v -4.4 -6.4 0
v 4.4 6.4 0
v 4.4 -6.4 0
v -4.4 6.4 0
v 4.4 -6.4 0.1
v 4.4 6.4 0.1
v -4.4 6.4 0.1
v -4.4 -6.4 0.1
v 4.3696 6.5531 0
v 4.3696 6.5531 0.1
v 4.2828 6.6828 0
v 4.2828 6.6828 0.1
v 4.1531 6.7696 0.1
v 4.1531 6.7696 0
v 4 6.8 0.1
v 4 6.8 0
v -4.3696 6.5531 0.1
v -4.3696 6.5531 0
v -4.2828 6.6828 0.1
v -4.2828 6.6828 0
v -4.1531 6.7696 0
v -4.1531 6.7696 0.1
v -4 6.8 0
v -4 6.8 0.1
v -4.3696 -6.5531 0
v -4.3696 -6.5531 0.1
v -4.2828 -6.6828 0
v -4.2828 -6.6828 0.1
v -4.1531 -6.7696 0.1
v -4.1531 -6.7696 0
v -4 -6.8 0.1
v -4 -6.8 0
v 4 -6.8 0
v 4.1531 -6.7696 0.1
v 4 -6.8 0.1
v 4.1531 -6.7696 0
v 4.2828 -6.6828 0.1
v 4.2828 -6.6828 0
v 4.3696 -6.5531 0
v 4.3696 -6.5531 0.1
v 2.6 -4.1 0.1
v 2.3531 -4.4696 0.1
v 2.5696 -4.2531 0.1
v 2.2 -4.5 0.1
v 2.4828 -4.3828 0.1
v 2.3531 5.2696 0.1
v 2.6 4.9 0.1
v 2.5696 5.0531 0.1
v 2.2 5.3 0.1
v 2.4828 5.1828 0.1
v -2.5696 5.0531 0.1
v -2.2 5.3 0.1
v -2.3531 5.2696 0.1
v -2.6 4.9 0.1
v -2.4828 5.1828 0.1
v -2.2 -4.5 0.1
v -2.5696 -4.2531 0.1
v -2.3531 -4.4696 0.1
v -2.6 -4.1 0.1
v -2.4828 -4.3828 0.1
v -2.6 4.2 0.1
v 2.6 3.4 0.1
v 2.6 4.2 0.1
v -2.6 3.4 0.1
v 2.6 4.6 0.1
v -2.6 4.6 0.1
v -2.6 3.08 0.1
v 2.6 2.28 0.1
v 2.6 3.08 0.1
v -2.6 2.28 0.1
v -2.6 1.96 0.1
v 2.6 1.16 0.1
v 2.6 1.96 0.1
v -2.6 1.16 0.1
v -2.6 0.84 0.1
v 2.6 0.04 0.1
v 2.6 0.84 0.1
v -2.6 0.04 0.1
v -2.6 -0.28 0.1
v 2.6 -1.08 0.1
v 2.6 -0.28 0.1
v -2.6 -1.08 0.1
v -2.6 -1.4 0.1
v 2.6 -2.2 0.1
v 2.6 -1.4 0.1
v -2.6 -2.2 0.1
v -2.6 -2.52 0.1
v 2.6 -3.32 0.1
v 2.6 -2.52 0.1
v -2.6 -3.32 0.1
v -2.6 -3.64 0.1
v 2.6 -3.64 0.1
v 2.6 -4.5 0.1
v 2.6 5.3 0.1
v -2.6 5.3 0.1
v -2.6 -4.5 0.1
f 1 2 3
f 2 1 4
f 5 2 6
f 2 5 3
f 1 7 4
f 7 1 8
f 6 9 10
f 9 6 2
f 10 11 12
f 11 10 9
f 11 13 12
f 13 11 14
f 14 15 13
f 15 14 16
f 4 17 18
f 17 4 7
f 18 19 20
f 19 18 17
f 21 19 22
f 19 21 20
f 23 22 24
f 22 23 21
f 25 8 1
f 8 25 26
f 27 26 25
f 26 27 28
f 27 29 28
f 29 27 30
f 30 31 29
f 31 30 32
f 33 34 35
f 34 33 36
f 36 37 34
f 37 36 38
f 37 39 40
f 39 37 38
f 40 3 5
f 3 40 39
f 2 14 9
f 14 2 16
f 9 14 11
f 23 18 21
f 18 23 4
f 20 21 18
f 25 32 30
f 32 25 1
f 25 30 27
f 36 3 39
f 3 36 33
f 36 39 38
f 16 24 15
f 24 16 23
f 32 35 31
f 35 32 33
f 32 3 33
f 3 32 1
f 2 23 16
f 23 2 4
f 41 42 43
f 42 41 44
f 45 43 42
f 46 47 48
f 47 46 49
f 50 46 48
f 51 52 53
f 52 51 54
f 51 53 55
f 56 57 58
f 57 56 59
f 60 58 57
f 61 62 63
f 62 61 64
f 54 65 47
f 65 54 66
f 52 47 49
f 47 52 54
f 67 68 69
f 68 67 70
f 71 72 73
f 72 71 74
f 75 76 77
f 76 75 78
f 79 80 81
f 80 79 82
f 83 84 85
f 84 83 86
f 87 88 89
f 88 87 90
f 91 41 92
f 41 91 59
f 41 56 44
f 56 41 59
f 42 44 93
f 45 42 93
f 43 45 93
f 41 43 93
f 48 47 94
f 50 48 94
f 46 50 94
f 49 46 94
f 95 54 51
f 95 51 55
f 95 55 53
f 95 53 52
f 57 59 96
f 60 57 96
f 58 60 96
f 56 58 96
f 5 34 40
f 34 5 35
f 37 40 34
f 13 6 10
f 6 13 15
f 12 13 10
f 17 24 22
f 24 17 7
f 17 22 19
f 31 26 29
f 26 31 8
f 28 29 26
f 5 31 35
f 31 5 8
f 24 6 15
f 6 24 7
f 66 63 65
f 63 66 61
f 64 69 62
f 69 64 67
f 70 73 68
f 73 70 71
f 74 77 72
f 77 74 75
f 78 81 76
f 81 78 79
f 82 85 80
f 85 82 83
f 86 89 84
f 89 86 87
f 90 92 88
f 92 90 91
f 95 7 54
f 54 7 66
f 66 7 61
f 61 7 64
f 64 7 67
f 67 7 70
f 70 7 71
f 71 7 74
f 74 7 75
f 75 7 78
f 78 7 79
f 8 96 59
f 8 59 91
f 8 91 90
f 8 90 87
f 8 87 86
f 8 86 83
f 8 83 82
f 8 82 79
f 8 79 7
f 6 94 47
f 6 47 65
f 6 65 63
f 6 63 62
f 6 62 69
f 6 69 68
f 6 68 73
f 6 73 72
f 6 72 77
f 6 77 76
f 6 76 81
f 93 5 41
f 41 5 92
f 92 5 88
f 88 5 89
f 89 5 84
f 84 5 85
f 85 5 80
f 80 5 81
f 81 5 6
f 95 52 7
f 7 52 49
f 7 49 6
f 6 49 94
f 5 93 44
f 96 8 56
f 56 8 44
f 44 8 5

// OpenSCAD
// file: ../p/4-4edge.scad
use <../lib.scad>
$fa=1; $fs=0.2;
function ldraw_lib__4_4edge(realsolid=false) = [
// 0 Circle 1.0
// 0 Name: 4-4edge.dat
// 0 Author: James Jessiman
// 0 !LDRAW_ORG Primitive UPDATE 2017-01
// 0 !LICENSE Licensed under CC BY 2.0 and CC BY 4.0 : see CAreadme.txt
// 
// 0 BFC CERTIFY CCW
  [0,"BFC","CERTIFY"],
  [0,"BFC","CCW"],
// 
// 0 !HISTORY 1998-12-15 [PTadmin] Official Update 1998-10
// 0 !HISTORY 2005-12-28 [PTadmin] Official Update 2005-01
// 0 !HISTORY 2007-06-24 [PTadmin] Header formatted for Contributor Agreement
// 0 !HISTORY 2008-07-01 [PTadmin] Official Update 2008-01
// 0 !HISTORY 2017-01-15 [Steffen] BFCed
// 0 !HISTORY 2017-12-30 [PTadmin] Official Update 2017-01
// 
// 
// 2 24 1 0 0 0.9239 0 0.3827
  [2,24,1,0,0,0.9239,0,0.3827],
// 2 24 0.9239 0 0.3827 0.7071 0 0.7071
  [2,24,0.9239,0,0.3827,0.7071,0,0.7071],
// 2 24 0.7071 0 0.7071 0.3827 0 0.9239
  [2,24,0.7071,0,0.7071,0.3827,0,0.9239],
// 2 24 0.3827 0 0.9239 0 0 1
  [2,24,0.3827,0,0.9239,0,0,1],
// 2 24 0 0 1 -0.3827 0 0.9239
  [2,24,0,0,1,-0.3827,0,0.9239],
// 2 24 -0.3827 0 0.9239 -0.7071 0 0.7071
  [2,24,-0.3827,0,0.9239,-0.7071,0,0.7071],
// 2 24 -0.7071 0 0.7071 -0.9239 0 0.3827
  [2,24,-0.7071,0,0.7071,-0.9239,0,0.3827],
// 2 24 -0.9239 0 0.3827 -1 0 -0
  [2,24,-0.9239,0,0.3827,-1,0,-0],
// 2 24 -1 0 -0 -0.9239 0 -0.3827
  [2,24,-1,0,-0,-0.9239,0,-0.3827],
// 2 24 -0.9239 0 -0.3827 -0.7071 0 -0.7071
  [2,24,-0.9239,0,-0.3827,-0.7071,0,-0.7071],
// 2 24 -0.7071 0 -0.7071 -0.3827 0 -0.9239
  [2,24,-0.7071,0,-0.7071,-0.3827,0,-0.9239],
// 2 24 -0.3827 0 -0.9239 0 0 -1
  [2,24,-0.3827,0,-0.9239,0,0,-1],
// 2 24 0 0 -1 0.3827 0 -0.9239
  [2,24,0,0,-1,0.3827,0,-0.9239],
// 2 24 0.3827 0 -0.9239 0.7071 0 -0.7071
  [2,24,0.3827,0,-0.9239,0.7071,0,-0.7071],
// 2 24 0.7071 0 -0.7071 0.9239 0 -0.3827
  [2,24,0.7071,0,-0.7071,0.9239,0,-0.3827],
// 2 24 0.9239 0 -0.3827 1 0 0
  [2,24,0.9239,0,-0.3827,1,0,0],
];
module ldraw_lib__4_4edge(step=0, col=false, unit=2/5, alt=false, line=0.2, solid=!$preview)
    makepoly(ldraw_lib__4_4edge(solid), step=step, col=col, unit=unit, alt=alt, line=line, solid=solid);
ldraw_lib__4_4edge(line=0.2);
// file: ../p/4-4disc.scad
use <../lib.scad>
$fa=1; $fs=0.2;
function ldraw_lib__4_4disc(realsolid=false) = [
// 0 Disc 1.0
// 0 Name: 4-4disc.dat
// 0 Author: James Jessiman
// 0 !LDRAW_ORG Primitive UPDATE 2002-02
// 0 !LICENSE Licensed under CC BY 2.0 and CC BY 4.0 : see CAreadme.txt
// 
// 0 BFC CERTIFY CCW
  [0,"BFC","CERTIFY"],
  [0,"BFC","CCW"],
// 
// 0 !HISTORY 1998-12-15 [PTadmin] Official Update 1998-10
// 0 !HISTORY 2002-03-23 [sbliss] Added BFC statement
// 0 !HISTORY 2002-04-25 [PTadmin] Official Update 2002-02
// 0 !HISTORY 2007-06-24 [PTadmin] Header formatted for Contributor Agreement
// 0 !HISTORY 2008-07-01 [PTadmin] Official Update 2008-01
// 
// 
// 3 16 0 0 0 1 0 0 0.9239 0 0.3827
  [3,16,0,0,0,1,0,0,0.9239,0,0.3827],
// 3 16 0 0 0 0.9239 0 0.3827 0.7071 0 0.7071
  [3,16,0,0,0,0.9239,0,0.3827,0.7071,0,0.7071],
// 3 16 0 0 0 0.7071 0 0.7071 0.3827 0 0.9239
  [3,16,0,0,0,0.7071,0,0.7071,0.3827,0,0.9239],
// 3 16 0 0 0 0.3827 0 0.9239 0 0 1
  [3,16,0,0,0,0.3827,0,0.9239,0,0,1],
// 3 16 0 0 0 0 0 1 -0.3827 0 0.9239
  [3,16,0,0,0,0,0,1,-0.3827,0,0.9239],
// 3 16 0 0 0 -0.3827 0 0.9239 -0.7071 0 0.7071
  [3,16,0,0,0,-0.3827,0,0.9239,-0.7071,0,0.7071],
// 3 16 0 0 0 -0.7071 0 0.7071 -0.9239 0 0.3827
  [3,16,0,0,0,-0.7071,0,0.7071,-0.9239,0,0.3827],
// 3 16 0 0 0 -0.9239 0 0.3827 -1 0 -0
  [3,16,0,0,0,-0.9239,0,0.3827,-1,0,-0],
// 3 16 0 0 0 -1 0 -0 -0.9239 0 -0.3827
  [3,16,0,0,0,-1,0,-0,-0.9239,0,-0.3827],
// 3 16 0 0 0 -0.9239 0 -0.3827 -0.7071 0 -0.7071
  [3,16,0,0,0,-0.9239,0,-0.3827,-0.7071,0,-0.7071],
// 3 16 0 0 0 -0.7071 0 -0.7071 -0.3827 0 -0.9239
  [3,16,0,0,0,-0.7071,0,-0.7071,-0.3827,0,-0.9239],
// 3 16 0 0 0 -0.3827 0 -0.9239 0 0 -1
  [3,16,0,0,0,-0.3827,0,-0.9239,0,0,-1],
// 3 16 0 0 0 0 0 -1 0.3827 0 -0.9239
  [3,16,0,0,0,0,0,-1,0.3827,0,-0.9239],
// 3 16 0 0 0 0.3827 0 -0.9239 0.7071 0 -0.7071
  [3,16,0,0,0,0.3827,0,-0.9239,0.7071,0,-0.7071],
// 3 16 0 0 0 0.7071 0 -0.7071 0.9239 0 -0.3827
  [3,16,0,0,0,0.7071,0,-0.7071,0.9239,0,-0.3827],
// 3 16 0 0 0 0.9239 0 -0.3827 1 0 0
  [3,16,0,0,0,0.9239,0,-0.3827,1,0,0],
// 0
];
module ldraw_lib__4_4disc(step=0, col=false, unit=2/5, alt=false, line=0.2, solid=!$preview)
    makepoly(ldraw_lib__4_4disc(solid), step=step, col=col, unit=unit, alt=alt, line=line, solid=solid);
ldraw_lib__4_4disc(line=0.2);
// file: ../p/4-4cyli.scad
use <../lib.scad>
$fa=1; $fs=0.2;
function ldraw_lib__4_4cyli(realsolid=false) = [
// 0 Cylinder 1.0
// 0 Name: 4-4cyli.dat
// 0 Author: James Jessiman
// 0 !LDRAW_ORG Primitive UPDATE 2005-01
// 0 !LICENSE Licensed under CC BY 2.0 and CC BY 4.0 : see CAreadme.txt
// 
// 0 BFC CERTIFY CCW
  [0,"BFC","CERTIFY"],
  [0,"BFC","CCW"],
// 
// 0 !HISTORY 1998-12-15 [PTadmin] Official Update 1998-10
// 0 !HISTORY 2002-03-23 [sbliss] Added BFC statement; merged headers from files in distributions LDraw 0.27 and Complete.
// 0 !HISTORY 2002-04-25 [PTadmin] Official Update 2002-02
// 0 !HISTORY 2004-12-14 [guyvivan] BFC CCW
// 0 !HISTORY 2005-12-28 [PTadmin] Official Update 2005-01
// 0 !HISTORY 2007-06-24 [PTadmin] Header formatted for Contributor Agreement
// 0 !HISTORY 2008-07-01 [PTadmin] Official Update 2008-01
// 
// 
// 4 16 1 1 0 0.9239 1 0.3827 0.9239 0 0.3827 1 0 0
  [4,16,1,1,0,0.9239,1,0.3827,0.9239,0,0.3827,1,0,0],
// 5 24 1 0 0 1 1 0 0.9239 0 0.3827 0.9239 0 -0.3827
  [5,24,1,0,0,1,1,0,0.9239,0,0.3827,0.9239,0,-0.3827],
// 4 16 0.9239 1 0.3827 0.7071 1 0.7071 0.7071 0 0.7071 0.9239 0 0.3827
  [4,16,0.9239,1,0.3827,0.7071,1,0.7071,0.7071,0,0.7071,0.9239,0,0.3827],
// 5 24 0.9239 0 0.3827 0.9239 1 0.3827 0.7071 0 0.7071 1 0 0
  [5,24,0.9239,0,0.3827,0.9239,1,0.3827,0.7071,0,0.7071,1,0,0],
// 4 16 0.7071 1 0.7071 0.3827 1 0.9239 0.3827 0 0.9239 0.7071 0 0.7071
  [4,16,0.7071,1,0.7071,0.3827,1,0.9239,0.3827,0,0.9239,0.7071,0,0.7071],
// 5 24 0.7071 0 0.7071 0.7071 1 0.7071 0.3827 0 0.9239 0.9239 0 0.3827
  [5,24,0.7071,0,0.7071,0.7071,1,0.7071,0.3827,0,0.9239,0.9239,0,0.3827],
// 4 16 0.3827 1 0.9239 0 1 1 0 0 1 0.3827 0 0.9239
  [4,16,0.3827,1,0.9239,0,1,1,0,0,1,0.3827,0,0.9239],
// 5 24 0.3827 0 0.9239 0.3827 1 0.9239 0 0 1 0.7071 0 0.7071
  [5,24,0.3827,0,0.9239,0.3827,1,0.9239,0,0,1,0.7071,0,0.7071],
// 4 16 0 1 1 -0.3827 1 0.9239 -0.3827 0 0.9239 0 0 1
  [4,16,0,1,1,-0.3827,1,0.9239,-0.3827,0,0.9239,0,0,1],
// 5 24 0 0 1 0 1 1 -0.3827 0 0.9239 0.3827 0 0.9239
  [5,24,0,0,1,0,1,1,-0.3827,0,0.9239,0.3827,0,0.9239],
// 4 16 -0.3827 1 0.9239 -0.7071 1 0.7071 -0.7071 0 0.7071 -0.3827 0 0.9239
  [4,16,-0.3827,1,0.9239,-0.7071,1,0.7071,-0.7071,0,0.7071,-0.3827,0,0.9239],
// 5 24 -0.3827 0 0.9239 -0.3827 1 0.9239 -0.7071 0 0.7071 0 0 1
  [5,24,-0.3827,0,0.9239,-0.3827,1,0.9239,-0.7071,0,0.7071,0,0,1],
// 4 16 -0.7071 1 0.7071 -0.9239 1 0.3827 -0.9239 0 0.3827 -0.7071 0 0.7071
  [4,16,-0.7071,1,0.7071,-0.9239,1,0.3827,-0.9239,0,0.3827,-0.7071,0,0.7071],
// 5 24 -0.7071 0 0.7071 -0.7071 1 0.7071 -0.9239 0 0.3827 -0.3827 0 0.9239
  [5,24,-0.7071,0,0.7071,-0.7071,1,0.7071,-0.9239,0,0.3827,-0.3827,0,0.9239],
// 4 16 -0.9239 1 0.3827 -1 1 0 -1 0 0 -0.9239 0 0.3827
  [4,16,-0.9239,1,0.3827,-1,1,0,-1,0,0,-0.9239,0,0.3827],
// 5 24 -0.9239 0 0.3827 -0.9239 1 0.3827 -1 0 0 -0.7071 0 0.7071
  [5,24,-0.9239,0,0.3827,-0.9239,1,0.3827,-1,0,0,-0.7071,0,0.7071],
// 4 16 -1 1 0 -0.9239 1 -0.3827 -0.9239 0 -0.3827 -1 0 0
  [4,16,-1,1,0,-0.9239,1,-0.3827,-0.9239,0,-0.3827,-1,0,0],
// 5 24 -1 0 0 -1 1 0 -0.9239 0 -0.3827 -0.9239 0 0.3827
  [5,24,-1,0,0,-1,1,0,-0.9239,0,-0.3827,-0.9239,0,0.3827],
// 4 16 -0.9239 1 -0.3827 -0.7071 1 -0.7071 -0.7071 0 -0.7071 -0.9239 0 -0.3827
  [4,16,-0.9239,1,-0.3827,-0.7071,1,-0.7071,-0.7071,0,-0.7071,-0.9239,0,-0.3827],
// 5 24 -0.9239 0 -0.3827 -0.9239 1 -0.3827 -0.7071 0 -0.7071 -1 0 0
  [5,24,-0.9239,0,-0.3827,-0.9239,1,-0.3827,-0.7071,0,-0.7071,-1,0,0],
// 4 16 -0.7071 1 -0.7071 -0.3827 1 -0.9239 -0.3827 0 -0.9239 -0.7071 0 -0.7071
  [4,16,-0.7071,1,-0.7071,-0.3827,1,-0.9239,-0.3827,0,-0.9239,-0.7071,0,-0.7071],
// 5 24 -0.7071 0 -0.7071 -0.7071 1 -0.7071 -0.3827 0 -0.9239 -0.9239 0 -0.3827
  [5,24,-0.7071,0,-0.7071,-0.7071,1,-0.7071,-0.3827,0,-0.9239,-0.9239,0,-0.3827],
// 4 16 -0.3827 1 -0.9239 0 1 -1 0 0 -1 -0.3827 0 -0.9239
  [4,16,-0.3827,1,-0.9239,0,1,-1,0,0,-1,-0.3827,0,-0.9239],
// 5 24 -0.3827 0 -0.9239 -0.3827 1 -0.9239 0 0 -1 -0.7071 0 -0.7071
  [5,24,-0.3827,0,-0.9239,-0.3827,1,-0.9239,0,0,-1,-0.7071,0,-0.7071],
// 4 16 0 1 -1 0.3827 1 -0.9239 0.3827 0 -0.9239 0 0 -1
  [4,16,0,1,-1,0.3827,1,-0.9239,0.3827,0,-0.9239,0,0,-1],
// 5 24 0 0 -1 0 1 -1 0.3827 0 -0.9239 -0.3827 0 -0.9239
  [5,24,0,0,-1,0,1,-1,0.3827,0,-0.9239,-0.3827,0,-0.9239],
// 4 16 0.3827 1 -0.9239 0.7071 1 -0.7071 0.7071 0 -0.7071 0.3827 0 -0.9239
  [4,16,0.3827,1,-0.9239,0.7071,1,-0.7071,0.7071,0,-0.7071,0.3827,0,-0.9239],
// 5 24 0.3827 0 -0.9239 0.3827 1 -0.9239 0.7071 0 -0.7071 0 0 -1
  [5,24,0.3827,0,-0.9239,0.3827,1,-0.9239,0.7071,0,-0.7071,0,0,-1],
// 4 16 0.7071 1 -0.7071 0.9239 1 -0.3827 0.9239 0 -0.3827 0.7071 0 -0.7071
  [4,16,0.7071,1,-0.7071,0.9239,1,-0.3827,0.9239,0,-0.3827,0.7071,0,-0.7071],
// 5 24 0.7071 0 -0.7071 0.7071 1 -0.7071 0.9239 0 -0.3827 0.3827 0 -0.9239
  [5,24,0.7071,0,-0.7071,0.7071,1,-0.7071,0.9239,0,-0.3827,0.3827,0,-0.9239],
// 4 16 0.9239 1 -0.3827 1 1 0 1 0 0 0.9239 0 -0.3827
  [4,16,0.9239,1,-0.3827,1,1,0,1,0,0,0.9239,0,-0.3827],
// 5 24 0.9239 0 -0.3827 0.9239 1 -0.3827 1 0 0 0.7071 0 -0.7071
  [5,24,0.9239,0,-0.3827,0.9239,1,-0.3827,1,0,0,0.7071,0,-0.7071],
// 0
];
module ldraw_lib__4_4cyli(step=0, col=false, unit=2/5, alt=false, line=0.2, solid=!$preview)
    makepoly(ldraw_lib__4_4cyli(solid), step=step, col=col, unit=unit, alt=alt, line=line, solid=solid);
ldraw_lib__4_4cyli(line=0.2);
// file: ../p/stud3.scad
use <../lib.scad>
use <4-4cyli.scad>
use <4-4disc.scad>
use <4-4edge.scad>
$fa=1; $fs=0.2;
function ldraw_lib__stud3(realsolid=false) = realsolid ? 
    [openscad(translate([0,0,-eps()], o=cylinder(4+eps(), r=4)),2)] : [
// 0 Stud Tube Solid
// 0 Name: stud3.dat
// 0 Author: James Jessiman
// 0 !LDRAW_ORG Primitive UPDATE 2012-01
// 0 !LICENSE Licensed under CC BY 2.0 and CC BY 4.0 : see CAreadme.txt
// 
// 0 BFC CERTIFY CCW
  [0,"BFC","CERTIFY"],
  [0,"BFC","CCW"],
// 
// 0 !HISTORY 2002-04-04 [sbliss] Modified for BFC compliance
// 0 !HISTORY 2002-04-25 [PTadmin] Official Update 2002-02
// 0 !HISTORY 2007-06-24 [PTadmin] Header formatted for Contributor Agreement
// 0 !HISTORY 2008-07-01 [PTadmin] Official Update 2008-01
// 0 !HISTORY 2012-02-16 [Philo] Changed to CCW
// 0 !HISTORY 2012-03-30 [PTadmin] Official Update 2012-01
// 
// 
// 1 16 0 -4 0 4 0 0 0 1 0 0 0 4 4-4edge.dat
  [1,16,0,-4,0,4,0,0,0,1,0,0,0,4, ldraw_lib__4_4edge(realsolid)],
// 1 16 0 0 0 4 0 0 0 1 0 0 0 4 4-4edge.dat
  [1,16,0,0,0,4,0,0,0,1,0,0,0,4, ldraw_lib__4_4edge(realsolid)],
// 1 16 0 -4 0 4 0 0 0 1 0 0 0 4 4-4disc.dat
  [1,16,0,-4,0,4,0,0,0,1,0,0,0,4, ldraw_lib__4_4disc(realsolid)],
// 1 16 0 -4 0 4 0 0 0 4 0 0 0 4 4-4cyli.dat
  [1,16,0,-4,0,4,0,0,0,4,0,0,0,4, ldraw_lib__4_4cyli(realsolid)],
];
module ldraw_lib__stud3(step=0, col=false, unit=2/5, alt=false, line=0.2, solid=!$preview)
    makepoly(ldraw_lib__stud3(solid), step=step, col=col, unit=unit, alt=alt, line=line, solid=solid);
ldraw_lib__stud3(line=0.2);
// file: ../p/stud.scad
use <../lib.scad>
use <4-4cyli.scad>
use <4-4disc.scad>
use <4-4edge.scad>
$fa=1; $fs=0.2;
function ldraw_lib__stud(realsolid=false) = realsolid ? 
    [openscad(translate([0,0,-eps()], o=cylinder(4+eps(), r=6)),2)] : [
// 0 Stud
// 0 Name: stud.dat
// 0 Author: James Jessiman
// 0 !LDRAW_ORG Primitive UPDATE 2012-01
// 0 !LICENSE Licensed under CC BY 2.0 and CC BY 4.0 : see CAreadme.txt
// 
// 0 BFC CERTIFY CCW
  [0,"BFC","CERTIFY"],
  [0,"BFC","CCW"],
// 
// 0 !HISTORY 2002-04-04 [sbliss] Modified for BFC compliance
// 0 !HISTORY 2002-04-25 [PTadmin] Official Update 2002-02
// 0 !HISTORY 2007-06-24 [PTadmin] Header formatted for Contributor Agreement
// 0 !HISTORY 2008-07-01 [PTadmin] Official Update 2008-01
// 0 !HISTORY 2012-02-16 [Philo] Changed to CCW
// 0 !HISTORY 2012-03-30 [PTadmin] Official Update 2012-01
// 
// 
// 1 16 0 0 0 6 0 0 0 1 0 0 0 6 4-4edge.dat
  [1,16,0,0,0,6,0,0,0,1,0,0,0,6, ldraw_lib__4_4edge(realsolid)],
// 1 16 0 -4 0 6 0 0 0 1 0 0 0 6 4-4edge.dat
  [1,16,0,-4,0,6,0,0,0,1,0,0,0,6, ldraw_lib__4_4edge(realsolid)],
// 1 16 0 0 0 6 0 0 0 -4 0 0 0 6 4-4cyli.dat
  [1,16,0,0,0,6,0,0,0,-4,0,0,0,6, ldraw_lib__4_4cyli(realsolid)],
// 1 16 0 -4 0 6 0 0 0 1 0 0 0 6 4-4disc.dat
  [1,16,0,-4,0,6,0,0,0,1,0,0,0,6, ldraw_lib__4_4disc(realsolid)],
];
module ldraw_lib__stud(step=0, col=false, unit=2/5, alt=false, line=0.2, solid=!$preview)
    makepoly(ldraw_lib__stud(solid), step=step, col=col, unit=unit, alt=alt, line=line, solid=solid);
ldraw_lib__stud(line=0.2);
// file: ../p/box5.scad
use <../lib.scad>
$fa=1; $fs=0.2;
function ldraw_lib__box5(realsolid=false) = [
// 0 Box with 5 Faces and All Edges
// 0 Name: box5.dat
// 0 Author: James Jessiman
// 0 !LDRAW_ORG Primitive UPDATE 2012-01
// 0 !LICENSE Licensed under CC BY 2.0 and CC BY 4.0 : see CAreadme.txt
// 
// 0 BFC CERTIFY CCW
  [0,"BFC","CERTIFY"],
  [0,"BFC","CCW"],
// 
// 0 !HISTORY 2002-04-03 [sbliss] Modified for BFC compliance
// 0 !HISTORY 2002-04-25 [PTadmin] Official Update 2002-02
// 0 !HISTORY 2007-06-24 [PTadmin] Header formatted for Contributor Agreement
// 0 !HISTORY 2008-07-01 [PTadmin] Official Update 2008-01
// 0 !HISTORY 2012-02-16 [Philo] Changed to CCW
// 0 !HISTORY 2012-03-30 [PTadmin] Official Update 2012-01
// 
// 
// 2 24 1 1 1 -1 1 1
  [2,24,1,1,1,-1,1,1],
// 2 24 -1 1 1 -1 1 -1
  [2,24,-1,1,1,-1,1,-1],
// 2 24 -1 1 -1 1 1 -1
  [2,24,-1,1,-1,1,1,-1],
// 2 24 1 1 -1 1 1 1
  [2,24,1,1,-1,1,1,1],
// 2 24 1 0 1 -1 0 1
  [2,24,1,0,1,-1,0,1],
// 2 24 -1 0 1 -1 0 -1
  [2,24,-1,0,1,-1,0,-1],
// 2 24 -1 0 -1 1 0 -1
  [2,24,-1,0,-1,1,0,-1],
// 2 24 1 0 -1 1 0 1
  [2,24,1,0,-1,1,0,1],
// 2 24 1 0 1 1 1 1
  [2,24,1,0,1,1,1,1],
// 2 24 -1 0 1 -1 1 1
  [2,24,-1,0,1,-1,1,1],
// 2 24 1 0 -1 1 1 -1
  [2,24,1,0,-1,1,1,-1],
// 2 24 -1 0 -1 -1 1 -1
  [2,24,-1,0,-1,-1,1,-1],
// 4 16 -1 1 1 1 1 1 1 1 -1 -1 1 -1
  [4,16,-1,1,1,1,1,1,1,1,-1,-1,1,-1],
// 4 16 -1 1 1 -1 0 1 1 0 1 1 1 1
  [4,16,-1,1,1,-1,0,1,1,0,1,1,1,1],
// 4 16 -1 1 -1 -1 0 -1 -1 0 1 -1 1 1
  [4,16,-1,1,-1,-1,0,-1,-1,0,1,-1,1,1],
// 4 16 1 1 -1 1 0 -1 -1 0 -1 -1 1 -1
  [4,16,1,1,-1,1,0,-1,-1,0,-1,-1,1,-1],
// 4 16 1 1 1 1 0 1 1 0 -1 1 1 -1
  [4,16,1,1,1,1,0,1,1,0,-1,1,1,-1],
];
module ldraw_lib__box5(step=0, col=false, unit=2/5, alt=false, line=0.2, solid=!$preview)
    makepoly(ldraw_lib__box5(solid), step=step, col=col, unit=unit, alt=alt, line=line, solid=solid);
ldraw_lib__box5(line=0.2);
// file: ../p/box4t.scad
use <../lib.scad>
$fa=1; $fs=0.2;
function ldraw_lib__box4t(realsolid=false) = [
// 0 Box with 4 Adjacent Faces and All Edges
// 0 Name: box4t.dat
// 0 Author: Tore Eriksson [Tore_Eriksson]
// 0 !LDRAW_ORG Primitive UPDATE 2003-02
// 0 !LICENSE Licensed under CC BY 2.0 and CC BY 4.0 : see CAreadme.txt
// 
// 0 BFC CERTIFY CCW
  [0,"BFC","CERTIFY"],
  [0,"BFC","CCW"],
// 
// 0 !HISTORY 1997-09-29 [PTadmin] Official Update 1997-15
// 0 !HISTORY 2002-08-31 [izanette] Modified with WINDZ for BFC compliance
// 0 !HISTORY 2003-08-01 [PTadmin] Official Update 2003-02
// 0 !HISTORY 2007-06-24 [PTadmin] Header formatted for Contributor Agreement
// 0 !HISTORY 2008-07-01 [PTadmin] Official Update 2008-01
// 
// 
// 2 24 1 1 1 -1 1 1
  [2,24,1,1,1,-1,1,1],
// 2 24 -1 1 1 -1 1 -1
  [2,24,-1,1,1,-1,1,-1],
// 2 24 -1 1 -1 1 1 -1
  [2,24,-1,1,-1,1,1,-1],
// 2 24 1 1 -1 1 1 1
  [2,24,1,1,-1,1,1,1],
// 2 24 1 0 1 -1 0 1
  [2,24,1,0,1,-1,0,1],
// 2 24 -1 0 1 -1 0 -1
  [2,24,-1,0,1,-1,0,-1],
// 2 24 -1 0 -1 1 0 -1
  [2,24,-1,0,-1,1,0,-1],
// 2 24 1 0 -1 1 0 1
  [2,24,1,0,-1,1,0,1],
// 2 24 1 0 1 1 1 1
  [2,24,1,0,1,1,1,1],
// 2 24 -1 0 1 -1 1 1
  [2,24,-1,0,1,-1,1,1],
// 2 24 1 0 -1 1 1 -1
  [2,24,1,0,-1,1,1,-1],
// 2 24 -1 0 -1 -1 1 -1
  [2,24,-1,0,-1,-1,1,-1],
// 4 16 1 1 1 1 1 -1 -1 1 -1 -1 1 1
  [4,16,1,1,1,1,1,-1,-1,1,-1,-1,1,1],
// 4 16 1 1 1 -1 1 1 -1 0 1 1 0 1
  [4,16,1,1,1,-1,1,1,-1,0,1,1,0,1],
// 4 16 -1 1 1 -1 1 -1 -1 0 -1 -1 0 1
  [4,16,-1,1,1,-1,1,-1,-1,0,-1,-1,0,1],
// 0 4 16 -1 1 -1 -1 0 -1 1 0 -1 1 1 -1
// 4 16 1 1 -1 1 1 1 1 0 1 1 0 -1
  [4,16,1,1,-1,1,1,1,1,0,1,1,0,-1],
// 0
];
module ldraw_lib__box4t(step=0, col=false, unit=2/5, alt=false, line=0.2, solid=!$preview)
    makepoly(ldraw_lib__box4t(solid), step=step, col=col, unit=unit, alt=alt, line=line, solid=solid);
ldraw_lib__box4t(line=0.2);
// file: s/3004s01.scad
use <../../lib.scad>
use <../../p/box4t.scad>
use <../../p/box5.scad>
use <../../p/stud.scad>
use <../../p/stud3.scad>
$fa=1; $fs=0.2;
function ldraw_lib__s__3004s01(realsolid=false) = [
// 0 ~Brick  1 x  2 without Front Face
// 0 Name: s\3004s01.dat
// 0 Author: James Jessiman
// 0 !LDRAW_ORG Subpart UPDATE 2003-03
// 0 !LICENSE Licensed under CC BY 2.0 and CC BY 4.0 : see CAreadme.txt
// 
// 0 BFC CERTIFY CCW
  [0,"BFC","CERTIFY"],
  [0,"BFC","CCW"],
// 
// 0 !HISTORY 2003-09-07 [jriley] Subfiling, BFC
// 0 !HISTORY 2003-12-19 [PTadmin] Official Update 2003-03
// 0 !HISTORY 2007-08-29 [PTadmin] Header formatted for Contributor Agreement
// 0 !HISTORY 2008-07-01 [PTadmin] Official Update 2008-01
// 
// 
// 1 16 0 4 0 1 0 0 0 -5 0 0 0 1 stud3.dat
  [1,16,0,4,0,1,0,0,0,-5,0,0,0,1, ldraw_lib__stud3(realsolid)],
// 0 BFC INVERTNEXT
  [0,"BFC","INVERTNEXT"],
// 1 16 0 24 0 16 0 0 0 -20 0 0 0 6 box5.dat
  [1,16,0,24,0,16,0,0,0,-20,0,0,0,6, ldraw_lib__box5(realsolid)],
// 4 16 20 24 10 16 24 6 -16 24 6 -20 24 10
  [4,16,20,24,10,16,24,6,-16,24,6,-20,24,10],
// 4 16 -20 24 10 -16 24 6 -16 24 -6 -20 24 -10
  [4,16,-20,24,10,-16,24,6,-16,24,-6,-20,24,-10],
// 4 16 -20 24 -10 -16 24 -6 16 24 -6 20 24 -10
  [4,16,-20,24,-10,-16,24,-6,16,24,-6,20,24,-10],
// 4 16 20 24 -10 16 24 -6 16 24 6 20 24 10
  [4,16,20,24,-10,16,24,-6,16,24,6,20,24,10],
// 1 16 0 24 0 20 0 0 0 -24 0 0 0 10 box4t.dat
  [1,16,0,24,0,20,0,0,0,-24,0,0,0,10, ldraw_lib__box4t(realsolid)],
// 1 16 10 0 0 1 0 0 0 1 0 0 0 1 stud.dat
  [1,16,10,0,0,1,0,0,0,1,0,0,0,1, ldraw_lib__stud(realsolid)],
// 1 16 -10 0 0 1 0 0 0 1 0 0 0 1 stud.dat
  [1,16,-10,0,0,1,0,0,0,1,0,0,0,1, ldraw_lib__stud(realsolid)],
// 0
];
module ldraw_lib__s__3004s01(step=0, col=false, unit=2/5, alt=false, line=0.2, solid=!$preview)
    makepoly(ldraw_lib__s__3004s01(solid), step=step, col=col, unit=unit, alt=alt, line=line, solid=solid);
ldraw_lib__s__3004s01(line=0.2);
// file: 3004.scad
use <../lib.scad>
use <s/3004s01.scad>
$fa=1; $fs=0.2;
function ldraw_lib__3004(realsolid=false) = [
// 0 Brick  1 x  2
// 0 Name: 3004.dat
// 0 Author: James Jessiman
// 0 !LDRAW_ORG Part UPDATE 2022-05
// 0 !LICENSE Licensed under CC BY 2.0 and CC BY 4.0 : see CAreadme.txt
// 
// 0 BFC CERTIFY CCW
  [0,"BFC","CERTIFY"],
  [0,"BFC","CCW"],
// 
// 0 !HISTORY 2001-10-26 [PTadmin] Official Update 2001-01
// 0 !HISTORY 2002-05-07 {unknown} BFC Certification
// 0 !HISTORY 2002-06-11 [PTadmin] Official Update 2002-03
// 0 !HISTORY 2007-05-07 [PTadmin] Header formatted for Contributor Agreement
// 0 !HISTORY 2008-07-01 [PTadmin] Official Update 2008-01
// 0 !HISTORY 2022-08-04 [MagFors] Using subfile
// 0 !HISTORY 2022-09-15 [PTadmin] Official Update 2022-05
// 
// 
// 1 16 0 0 0 1 0 0 0 1 0 0 0 1 s\3004s01.dat
  [1,16,0,0,0,1,0,0,0,1,0,0,0,1, ldraw_lib__s__3004s01(realsolid)],
// 4 16 -20 24 -10 20 24 -10 20 0 -10 -20 0 -10
  [4,16,-20,24,-10,20,24,-10,20,0,-10,-20,0,-10],
];
module ldraw_lib__3004(step=0, col=false, unit=2/5, alt=false, line=0.2, solid=!$preview)
    makepoly(ldraw_lib__3004(solid), step=step, col=col, unit=unit, alt=alt, line=line, solid=solid);
ldraw_lib__3004(line=0.2);
// file: ../p/box3u12.scad
use <../lib.scad>
$fa=1; $fs=0.2;
function ldraw_lib__box3u12(realsolid=false) = [
// 0 Box with 3 Parallel Faces without Any Edges
// 0 Name: box3u12.dat
// 0 Author: J.C. Tchang [tchang]
// 0 !LDRAW_ORG Primitive UPDATE 2014-02
// 0 !LICENSE Licensed under CC BY 2.0 and CC BY 4.0 : see CAreadme.txt
// 
// 0 BFC CERTIFY CCW
  [0,"BFC","CERTIFY"],
  [0,"BFC","CCW"],
// 
// 0 !HISTORY 2014-12-23 [PTadmin] Official Update 2014-02
// 
// 
// 4 16 -1 1 1 1 1 1 1 1 -1 -1 1 -1
  [4,16,-1,1,1,1,1,1,1,1,-1,-1,1,-1],
// 4 16 -1 1 1 -1 0 1 1 0 1 1 1 1
  [4,16,-1,1,1,-1,0,1,1,0,1,1,1,1],
// 4 16 1 1 -1 1 0 -1 -1 0 -1 -1 1 -1
  [4,16,1,1,-1,1,0,-1,-1,0,-1,-1,1,-1],
];
module ldraw_lib__box3u12(step=0, col=false, unit=2/5, alt=false, line=0.2, solid=!$preview)
    makepoly(ldraw_lib__box3u12(solid), step=step, col=col, unit=unit, alt=alt, line=line, solid=solid);
ldraw_lib__box3u12(line=0.2);
// file: ../p/1-4ndis.scad
use <../lib.scad>
$fa=1; $fs=0.2;
function ldraw_lib__1_4ndis(realsolid=false) = [
// 0 Disc Negative 0.25
// 0 Name: 1-4ndis.dat
// 0 Author: James Jessiman
// 0 !LDRAW_ORG Primitive UPDATE 2012-01
// 0 !LICENSE Licensed under CC BY 2.0 and CC BY 4.0 : see CAreadme.txt
// 
// 0 BFC CERTIFY CCW
  [0,"BFC","CERTIFY"],
  [0,"BFC","CCW"],
// 
// 0 !HISTORY 2002-03-23 [sbliss] Added BFC Statement
// 0 !HISTORY 2002-04-25 [PTadmin] Official Update 2002-02
// 0 !HISTORY 2007-06-22 [PTadmin] Header formatted for Contributor Agreement
// 0 !HISTORY 2008-07-01 [PTadmin] Official Update 2008-01
// 0 !HISTORY 2012-02-16 [Philo] Changed to CCW
// 0 !HISTORY 2012-03-30 [PTadmin] Official Update 2012-01
// 
// 
// 3 16 0.9239 0 0.3827 1 0 0 1 0 1
  [3,16,0.9239,0,0.3827,1,0,0,1,0,1],
// 3 16 0.7071 0 0.7071 0.9239 0 0.3827 1 0 1
  [3,16,0.7071,0,0.7071,0.9239,0,0.3827,1,0,1],
// 3 16 0.3827 0 0.9239 0.7071 0 0.7071 1 0 1
  [3,16,0.3827,0,0.9239,0.7071,0,0.7071,1,0,1],
// 3 16 0 0 1 0.3827 0 0.9239 1 0 1
  [3,16,0,0,1,0.3827,0,0.9239,1,0,1],
];
module ldraw_lib__1_4ndis(step=0, col=false, unit=2/5, alt=false, line=0.2, solid=!$preview)
    makepoly(ldraw_lib__1_4ndis(solid), step=step, col=col, unit=unit, alt=alt, line=line, solid=solid);
ldraw_lib__1_4ndis(line=0.2);
// file: ../p/1-4cyli.scad
use <../lib.scad>
$fa=1; $fs=0.2;
function ldraw_lib__1_4cyli(realsolid=false) = [
// 0 Cylinder 0.25
// 0 Name: 1-4cyli.dat
// 0 Author: James Jessiman
// 0 !LDRAW_ORG Primitive UPDATE 2012-01
// 0 !LICENSE Licensed under CC BY 2.0 and CC BY 4.0 : see CAreadme.txt
// 
// 0 BFC CERTIFY CCW
  [0,"BFC","CERTIFY"],
  [0,"BFC","CCW"],
// 
// 0 !HISTORY 2002-03-23 [sbliss] Added BFC statement.
// 0 !HISTORY 2002-04-25 [PTadmin] Official Update 2002-02
// 0 !HISTORY 2007-06-22 [PTadmin] Header formatted for Contributor Agreement
// 0 !HISTORY 2008-07-01 [PTadmin] Official Update 2008-01
// 0 !HISTORY 2012-02-16 [Philo] Changed to CCW
// 0 !HISTORY 2012-03-30 [PTadmin] Official Update 2012-01
// 
// 
// 4 16 1 1 0 0.9239 1 0.3827 0.9239 0 0.3827 1 0 0
  [4,16,1,1,0,0.9239,1,0.3827,0.9239,0,0.3827,1,0,0],
// 5 24 1 0 0 1 1 0 0.9239 0 0.3827 1 0 -1
  [5,24,1,0,0,1,1,0,0.9239,0,0.3827,1,0,-1],
// 4 16 0.9239 1 0.3827 0.7071 1 0.7071 0.7071 0 0.7071 0.9239 0 0.3827
  [4,16,0.9239,1,0.3827,0.7071,1,0.7071,0.7071,0,0.7071,0.9239,0,0.3827],
// 5 24 0.9239 0 0.3827 0.9239 1 0.3827 0.7071 0 0.7071 1 0 0
  [5,24,0.9239,0,0.3827,0.9239,1,0.3827,0.7071,0,0.7071,1,0,0],
// 4 16 0.7071 1 0.7071 0.3827 1 0.9239 0.3827 0 0.9239 0.7071 0 0.7071
  [4,16,0.7071,1,0.7071,0.3827,1,0.9239,0.3827,0,0.9239,0.7071,0,0.7071],
// 5 24 0.7071 0 0.7071 0.7071 1 0.7071 0.3827 0 0.9239 0.9239 0 0.3827
  [5,24,0.7071,0,0.7071,0.7071,1,0.7071,0.3827,0,0.9239,0.9239,0,0.3827],
// 4 16 0.3827 1 0.9239 0 1 1 0 0 1 0.3827 0 0.9239
  [4,16,0.3827,1,0.9239,0,1,1,0,0,1,0.3827,0,0.9239],
// 5 24 0.3827 0 0.9239 0.3827 1 0.9239 0 0 1 0.7071 0 0.7071
  [5,24,0.3827,0,0.9239,0.3827,1,0.9239,0,0,1,0.7071,0,0.7071],
// 5 24 0 0 1 0 1 1 0.3827 0 0.9239 -1 0 1
  [5,24,0,0,1,0,1,1,0.3827,0,0.9239,-1,0,1],
];
module ldraw_lib__1_4cyli(step=0, col=false, unit=2/5, alt=false, line=0.2, solid=!$preview)
    makepoly(ldraw_lib__1_4cyli(solid), step=step, col=col, unit=unit, alt=alt, line=line, solid=solid);
ldraw_lib__1_4cyli(line=0.2);
// file: ../p/1-4chrd.scad
use <../lib.scad>
$fa=1; $fs=0.2;
function ldraw_lib__1_4chrd(realsolid=false) = [
// 0 Chord 0.25
// 0 Name: 1-4chrd.dat
// 0 Author: Tony Hafner [hafhead]
// 0 !LDRAW_ORG Primitive UPDATE 2012-02
// 0 !LICENSE Licensed under CC BY 2.0 and CC BY 4.0 : see CAreadme.txt
// 
// 0 BFC CERTIFY CCW
  [0,"BFC","CERTIFY"],
  [0,"BFC","CCW"],
// 
// 0 !HISTORY 2004-04-22 [PTadmin] Official Update 2004-02
// 0 !HISTORY 2007-10-09 [PTadmin] Header formatted for Contributor Agreement
// 0 !HISTORY 2008-07-01 [PTadmin] Official Update 2008-01
// 0 !HISTORY 2012-08-02 [MMR1988] Re-creation with PrimGen2 and Rectifier
// 0 !HISTORY 2012-08-09 [PTadmin] Official Update 2012-02
// 
// 
// 4 16 0.9239 0 0.3827 0.3827 0 0.9239 0 0 1 1 0 0
  [4,16,0.9239,0,0.3827,0.3827,0,0.9239,0,0,1,1,0,0],
// 3 16 0.7071 0 0.7071 0.3827 0 0.9239 0.9239 0 0.3827
  [3,16,0.7071,0,0.7071,0.3827,0,0.9239,0.9239,0,0.3827],
];
module ldraw_lib__1_4chrd(step=0, col=false, unit=2/5, alt=false, line=0.2, solid=!$preview)
    makepoly(ldraw_lib__1_4chrd(solid), step=step, col=col, unit=unit, alt=alt, line=line, solid=solid);
ldraw_lib__1_4chrd(line=0.2);
// main file
use <../lib.scad>
use <../p/1-4chrd.scad>
use <../p/1-4cyli.scad>
use <../p/1-4ndis.scad>
use <../p/box3u12.scad>
$fa=1; $fs=0.2;
function ldraw_lib__4111899j(realsolid=false) = [
// 0 Sticker  1.7 x  1.1 with Light Grey Grille and Black Background
// 0 Name: 4111899j.dat
// 0 Author: Ulrich Röder [UR]
// 0 !LDRAW_ORG Part UPDATE 2020-03
// 0 !LICENSE Licensed under CC BY 2.0 and CC BY 4.0 : see CAreadme.txt
// 
// 0 BFC CERTIFY CCW
  [0,"BFC","CERTIFY"],
  [0,"BFC","CCW"],
// 
// 0 !KEYWORDS Black Thunder, helicopter, Set 5542
// 
// 0 !HISTORY 2020-12-29 [PTadmin] Official Update 2020-03
// 
// 
// 1 16 0 -.25 0 0 0 11 0 .25 0 -16 0 0 box3u12.dat
  [1,16,0,-.25,0,0,0,11,0,.25,0,-16,0,0, ldraw_lib__box3u12(realsolid)],
// 1 16 10 0 16 1 0 0 0 -.25 0 0 0 1 1-4cyli.dat
  [1,16,10,0,16,1,0,0,0,-.25,0,0,0,1, ldraw_lib__1_4cyli(realsolid)],
// 1 16 -10 0 16 -1 0 0 0 -.25 0 0 0 1 1-4cyli.dat
  [1,16,-10,0,16,-1,0,0,0,-.25,0,0,0,1, ldraw_lib__1_4cyli(realsolid)],
// 1 16 -10 0 -16 -1 0 0 0 -.25 0 0 0 -1 1-4cyli.dat
  [1,16,-10,0,-16,-1,0,0,0,-.25,0,0,0,-1, ldraw_lib__1_4cyli(realsolid)],
// 1 16 10 0 -16 0 0 1 0 -.25 0 -1 0 0 1-4cyli.dat
  [1,16,10,0,-16,0,0,1,0,-.25,0,-1,0,0, ldraw_lib__1_4cyli(realsolid)],
// 1 16 10 0 16 1 0 0 0 -1 0 0 0 1 1-4chrd.dat
  [1,16,10,0,16,1,0,0,0,-1,0,0,0,1, ldraw_lib__1_4chrd(realsolid)],
// 1 16 -10 0 16 -1 0 0 0 -1 0 0 0 1 1-4chrd.dat
  [1,16,-10,0,16,-1,0,0,0,-1,0,0,0,1, ldraw_lib__1_4chrd(realsolid)],
// 1 16 -10 0 -16 -1 0 0 0 -1 0 0 0 -1 1-4chrd.dat
  [1,16,-10,0,-16,-1,0,0,0,-1,0,0,0,-1, ldraw_lib__1_4chrd(realsolid)],
// 1 16 10 0 -16 0 0 1 0 -1 0 -1 0 0 1-4chrd.dat
  [1,16,10,0,-16,0,0,1,0,-1,0,-1,0,0, ldraw_lib__1_4chrd(realsolid)],
// 4 16 10 -.25 17 10 0 17 -10 0 17 -10 -.25 17
  [4,16,10,-.25,17,10,0,17,-10,0,17,-10,-.25,17],
// 4 16 -10 0 -17 10 0 -17 10 -.25 -17 -10 -.25 -17
  [4,16,-10,0,-17,10,0,-17,10,-.25,-17,-10,-.25,-17],
// 4 16 11 0 -16 10 0 -17 -10 0 -17 -11 0 -16
  [4,16,11,0,-16,10,0,-17,-10,0,-17,-11,0,-16],
// 4 16 -11 0 16 -10 0 17 10 0 17 11 0 16
  [4,16,-11,0,16,-10,0,17,10,0,17,11,0,16],
// 
// 1 7 5.5 -.25 -10.25 0 0 1 0 1 0 -1 0 0 1-4chrd.dat
  [1,7,5.5,-.25,-10.25,0,0,1,0,1,0,-1,0,0, ldraw_lib__1_4chrd(realsolid)],
// 1 7 5.5 -.25 12.25 1 0 0 0 1 0 0 0 1 1-4chrd.dat
  [1,7,5.5,-.25,12.25,1,0,0,0,1,0,0,0,1, ldraw_lib__1_4chrd(realsolid)],
// 1 7 -5.5 -.25 12.25 -1 0 0 0 1 0 0 0 1 1-4chrd.dat
  [1,7,-5.5,-.25,12.25,-1,0,0,0,1,0,0,0,1, ldraw_lib__1_4chrd(realsolid)],
// 1 7 -5.5 -.25 -10.25 -1 0 0 0 1 0 0 0 -1 1-4chrd.dat
  [1,7,-5.5,-.25,-10.25,-1,0,0,0,1,0,0,0,-1, ldraw_lib__1_4chrd(realsolid)],
// 4 7 -6.5 -.25 8.5 6.5 -.25 8.5 6.5 -.25 10.5 -6.5 -.25 10.5
  [4,7,-6.5,-.25,8.5,6.5,-.25,8.5,6.5,-.25,10.5,-6.5,-.25,10.5],
// 4 7 -6.5 -.25 11.5 6.5 -.25 11.5 6.5 -.25 12.25 -6.5 -.25 12.25
  [4,7,-6.5,-.25,11.5,6.5,-.25,11.5,6.5,-.25,12.25,-6.5,-.25,12.25],
// 4 7 -6.5 -.25 12.25 6.5 -.25 12.25 5.5 -.25 13.25 -5.5 -.25 13.25
  [4,7,-6.5,-.25,12.25,6.5,-.25,12.25,5.5,-.25,13.25,-5.5,-.25,13.25],
// 4 7 -6.5 -.25 5.7 6.5 -.25 5.7 6.5 -.25 7.7 -6.5 -.25 7.7
  [4,7,-6.5,-.25,5.7,6.5,-.25,5.7,6.5,-.25,7.7,-6.5,-.25,7.7],
// 4 7 -6.5 -.25 2.9 6.5 -.25 2.9 6.5 -.25 4.9 -6.5 -.25 4.9
  [4,7,-6.5,-.25,2.9,6.5,-.25,2.9,6.5,-.25,4.9,-6.5,-.25,4.9],
// 4 7 -6.5 -.25 .1 6.5 -.25 .1 6.5 -.25 2.1 -6.5 -.25 2.1
  [4,7,-6.5,-.25,.1,6.5,-.25,.1,6.5,-.25,2.1,-6.5,-.25,2.1],
// 4 7 -6.5 -.25 -2.7 6.5 -.25 -2.7 6.5 -.25 -.7 -6.5 -.25 -.7
  [4,7,-6.5,-.25,-2.7,6.5,-.25,-2.7,6.5,-.25,-.7,-6.5,-.25,-.7],
// 4 7 -6.5 -.25 -5.5 6.5 -.25 -5.5 6.5 -.25 -3.5 -6.5 -.25 -3.5
  [4,7,-6.5,-.25,-5.5,6.5,-.25,-5.5,6.5,-.25,-3.5,-6.5,-.25,-3.5],
// 4 7 -6.5 -.25 -8.3 6.5 -.25 -8.3 6.5 -.25 -6.3 -6.5 -.25 -6.3
  [4,7,-6.5,-.25,-8.3,6.5,-.25,-8.3,6.5,-.25,-6.3,-6.5,-.25,-6.3],
// 4 7 -6.5 -.25 -10.25 6.5 -.25 -10.25 6.5 -.25 -9.1 -6.5 -.25 -9.1
  [4,7,-6.5,-.25,-10.25,6.5,-.25,-10.25,6.5,-.25,-9.1,-6.5,-.25,-9.1],
// 4 7 -5.5 -.25 -11.25 5.5 -.25 -11.25 6.5 -.25 -10.25 -6.5 -.25 -10.25
  [4,7,-5.5,-.25,-11.25,5.5,-.25,-11.25,6.5,-.25,-10.25,-6.5,-.25,-10.25],
// 
// 1 0 5.5 -.25 -10.25 0 0 1 0 1 0 -1 0 0 1-4ndis.dat
  [1,0,5.5,-.25,-10.25,0,0,1,0,1,0,-1,0,0, ldraw_lib__1_4ndis(realsolid)],
// 1 0 5.5 -.25 12.25 1 0 0 0 1 0 0 0 1 1-4ndis.dat
  [1,0,5.5,-.25,12.25,1,0,0,0,1,0,0,0,1, ldraw_lib__1_4ndis(realsolid)],
// 1 0 -5.5 -.25 12.25 -1 0 0 0 1 0 0 0 1 1-4ndis.dat
  [1,0,-5.5,-.25,12.25,-1,0,0,0,1,0,0,0,1, ldraw_lib__1_4ndis(realsolid)],
// 1 0 -5.5 -.25 -10.25 -1 0 0 0 1 0 0 0 -1 1-4ndis.dat
  [1,0,-5.5,-.25,-10.25,-1,0,0,0,1,0,0,0,-1, ldraw_lib__1_4ndis(realsolid)],
// 1 0 10 -.25 -16 0 0 1 0 1 0 -1 0 0 1-4chrd.dat
  [1,0,10,-.25,-16,0,0,1,0,1,0,-1,0,0, ldraw_lib__1_4chrd(realsolid)],
// 1 0 10 -.25 16 1 0 0 0 1 0 0 0 1 1-4chrd.dat
  [1,0,10,-.25,16,1,0,0,0,1,0,0,0,1, ldraw_lib__1_4chrd(realsolid)],
// 1 0 -10 -.25 16 -1 0 0 0 1 0 0 0 1 1-4chrd.dat
  [1,0,-10,-.25,16,-1,0,0,0,1,0,0,0,1, ldraw_lib__1_4chrd(realsolid)],
// 1 0 -10 -.25 -16 -1 0 0 0 1 0 0 0 -1 1-4chrd.dat
  [1,0,-10,-.25,-16,-1,0,0,0,1,0,0,0,-1, ldraw_lib__1_4chrd(realsolid)],
// 4 0 -10 -.25 -17 10 -.25 -17 11 -.25 -16 -11 -.25 -16
  [4,0,-10,-.25,-17,10,-.25,-17,11,-.25,-16,-11,-.25,-16],
// 4 0 10 -.25 17 -10 -.25 17 -11 -.25 16 11 -.25 16
  [4,0,10,-.25,17,-10,-.25,17,-11,-.25,16,11,-.25,16],
// 4 0 -6.5 -.25 10.5 6.5 -.25 10.5 6.5 -.25 11.5 -6.5 -.25 11.5
  [4,0,-6.5,-.25,10.5,6.5,-.25,10.5,6.5,-.25,11.5,-6.5,-.25,11.5],
// 4 0 -6.5 -.25 7.7 6.5 -.25 7.7 6.5 -.25 8.5 -6.5 -.25 8.5
  [4,0,-6.5,-.25,7.7,6.5,-.25,7.7,6.5,-.25,8.5,-6.5,-.25,8.5],
// 4 0 -6.5 -.25 4.9 6.5 -.25 4.9 6.5 -.25 5.7 -6.5 -.25 5.7
  [4,0,-6.5,-.25,4.9,6.5,-.25,4.9,6.5,-.25,5.7,-6.5,-.25,5.7],
// 4 0 -6.5 -.25 2.1 6.5 -.25 2.1 6.5 -.25 2.9 -6.5 -.25 2.9
  [4,0,-6.5,-.25,2.1,6.5,-.25,2.1,6.5,-.25,2.9,-6.5,-.25,2.9],
// 4 0 -6.5 -.25 -.7 6.5 -.25 -.7 6.5 -.25 .1 -6.5 -.25 .1
  [4,0,-6.5,-.25,-.7,6.5,-.25,-.7,6.5,-.25,.1,-6.5,-.25,.1],
// 4 0 -6.5 -.25 -3.5 6.5 -.25 -3.5 6.5 -.25 -2.7 -6.5 -.25 -2.7
  [4,0,-6.5,-.25,-3.5,6.5,-.25,-3.5,6.5,-.25,-2.7,-6.5,-.25,-2.7],
// 4 0 -6.5 -.25 -6.3 6.5 -.25 -6.3 6.5 -.25 -5.5 -6.5 -.25 -5.5
  [4,0,-6.5,-.25,-6.3,6.5,-.25,-6.3,6.5,-.25,-5.5,-6.5,-.25,-5.5],
// 4 0 -6.5 -.25 -9.1 6.5 -.25 -9.1 6.5 -.25 -8.3 -6.5 -.25 -8.3
  [4,0,-6.5,-.25,-9.1,6.5,-.25,-9.1,6.5,-.25,-8.3,-6.5,-.25,-8.3],
// 3 0 -6.5 -.25 13.25 -11 -.25 16 -6.5 -.25 12.25
  [3,0,-6.5,-.25,13.25,-11,-.25,16,-6.5,-.25,12.25],
// 3 0 -6.5 -.25 12.25 -11 -.25 16 -6.5 -.25 11.5
  [3,0,-6.5,-.25,12.25,-11,-.25,16,-6.5,-.25,11.5],
// 3 0 -6.5 -.25 11.5 -11 -.25 16 -6.5 -.25 10.5
  [3,0,-6.5,-.25,11.5,-11,-.25,16,-6.5,-.25,10.5],
// 3 0 -6.5 -.25 10.5 -11 -.25 16 -6.5 -.25 8.5
  [3,0,-6.5,-.25,10.5,-11,-.25,16,-6.5,-.25,8.5],
// 3 0 -6.5 -.25 8.5 -11 -.25 16 -6.5 -.25 7.7
  [3,0,-6.5,-.25,8.5,-11,-.25,16,-6.5,-.25,7.7],
// 3 0 -6.5 -.25 7.7 -11 -.25 16 -6.5 -.25 5.7
  [3,0,-6.5,-.25,7.7,-11,-.25,16,-6.5,-.25,5.7],
// 3 0 -6.5 -.25 5.7 -11 -.25 16 -6.5 -.25 4.9
  [3,0,-6.5,-.25,5.7,-11,-.25,16,-6.5,-.25,4.9],
// 3 0 -6.5 -.25 4.9 -11 -.25 16 -6.5 -.25 2.9
  [3,0,-6.5,-.25,4.9,-11,-.25,16,-6.5,-.25,2.9],
// 3 0 -6.5 -.25 2.9 -11 -.25 16 -6.5 -.25 2.1
  [3,0,-6.5,-.25,2.9,-11,-.25,16,-6.5,-.25,2.1],
// 3 0 -6.5 -.25 2.1 -11 -.25 16 -6.5 -.25 .1
  [3,0,-6.5,-.25,2.1,-11,-.25,16,-6.5,-.25,.1],
// 3 0 -6.5 -.25 .1 -11 -.25 16 -6.5 -.25 -.7
  [3,0,-6.5,-.25,.1,-11,-.25,16,-6.5,-.25,-.7],
// 3 0 -11 -.25 -16 -6.5 -.25 -11.25 -6.5 -.25 -10.25
  [3,0,-11,-.25,-16,-6.5,-.25,-11.25,-6.5,-.25,-10.25],
// 3 0 -11 -.25 -16 -6.5 -.25 -10.25 -6.5 -.25 -9.1
  [3,0,-11,-.25,-16,-6.5,-.25,-10.25,-6.5,-.25,-9.1],
// 3 0 -11 -.25 -16 -6.5 -.25 -9.1 -6.5 -.25 -8.3
  [3,0,-11,-.25,-16,-6.5,-.25,-9.1,-6.5,-.25,-8.3],
// 3 0 -11 -.25 -16 -6.5 -.25 -8.3 -6.5 -.25 -6.3
  [3,0,-11,-.25,-16,-6.5,-.25,-8.3,-6.5,-.25,-6.3],
// 3 0 -11 -.25 -16 -6.5 -.25 -6.3 -6.5 -.25 -5.5
  [3,0,-11,-.25,-16,-6.5,-.25,-6.3,-6.5,-.25,-5.5],
// 3 0 -11 -.25 -16 -6.5 -.25 -5.5 -6.5 -.25 -3.5
  [3,0,-11,-.25,-16,-6.5,-.25,-5.5,-6.5,-.25,-3.5],
// 3 0 -11 -.25 -16 -6.5 -.25 -3.5 -6.5 -.25 -2.7
  [3,0,-11,-.25,-16,-6.5,-.25,-3.5,-6.5,-.25,-2.7],
// 3 0 -11 -.25 -16 -6.5 -.25 -2.7 -6.5 -.25 -.7
  [3,0,-11,-.25,-16,-6.5,-.25,-2.7,-6.5,-.25,-.7],
// 3 0 -11 -.25 -16 -6.5 -.25 -.7 -11 -.25 16
  [3,0,-11,-.25,-16,-6.5,-.25,-.7,-11,-.25,16],
// 3 0 11 -.25 16 6.5 -.25 13.25 6.5 -.25 12.25
  [3,0,11,-.25,16,6.5,-.25,13.25,6.5,-.25,12.25],
// 3 0 11 -.25 16 6.5 -.25 12.25 6.5 -.25 11.5
  [3,0,11,-.25,16,6.5,-.25,12.25,6.5,-.25,11.5],
// 3 0 11 -.25 16 6.5 -.25 11.5 6.5 -.25 10.5
  [3,0,11,-.25,16,6.5,-.25,11.5,6.5,-.25,10.5],
// 3 0 11 -.25 16 6.5 -.25 10.5 6.5 -.25 8.5
  [3,0,11,-.25,16,6.5,-.25,10.5,6.5,-.25,8.5],
// 3 0 11 -.25 16 6.5 -.25 8.5 6.5 -.25 7.7
  [3,0,11,-.25,16,6.5,-.25,8.5,6.5,-.25,7.7],
// 3 0 11 -.25 16 6.5 -.25 7.7 6.5 -.25 5.7
  [3,0,11,-.25,16,6.5,-.25,7.7,6.5,-.25,5.7],
// 3 0 11 -.25 16 6.5 -.25 5.7 6.5 -.25 4.9
  [3,0,11,-.25,16,6.5,-.25,5.7,6.5,-.25,4.9],
// 3 0 11 -.25 16 6.5 -.25 4.9 6.5 -.25 2.9
  [3,0,11,-.25,16,6.5,-.25,4.9,6.5,-.25,2.9],
// 3 0 11 -.25 16 6.5 -.25 2.9 6.5 -.25 2.1
  [3,0,11,-.25,16,6.5,-.25,2.9,6.5,-.25,2.1],
// 3 0 11 -.25 16 6.5 -.25 2.1 6.5 -.25 .1
  [3,0,11,-.25,16,6.5,-.25,2.1,6.5,-.25,.1],
// 3 0 11 -.25 16 6.5 -.25 .1 6.5 -.25 -.7
  [3,0,11,-.25,16,6.5,-.25,.1,6.5,-.25,-.7],
// 3 0 6.5 -.25 -11.25 11 -.25 -16 6.5 -.25 -10.25
  [3,0,6.5,-.25,-11.25,11,-.25,-16,6.5,-.25,-10.25],
// 3 0 6.5 -.25 -10.25 11 -.25 -16 6.5 -.25 -9.1
  [3,0,6.5,-.25,-10.25,11,-.25,-16,6.5,-.25,-9.1],
// 3 0 6.5 -.25 -9.1 11 -.25 -16 6.5 -.25 -8.3
  [3,0,6.5,-.25,-9.1,11,-.25,-16,6.5,-.25,-8.3],
// 3 0 6.5 -.25 -8.3 11 -.25 -16 6.5 -.25 -6.3
  [3,0,6.5,-.25,-8.3,11,-.25,-16,6.5,-.25,-6.3],
// 3 0 6.5 -.25 -6.3 11 -.25 -16 6.5 -.25 -5.5
  [3,0,6.5,-.25,-6.3,11,-.25,-16,6.5,-.25,-5.5],
// 3 0 6.5 -.25 -5.5 11 -.25 -16 6.5 -.25 -3.5
  [3,0,6.5,-.25,-5.5,11,-.25,-16,6.5,-.25,-3.5],
// 3 0 6.5 -.25 -3.5 11 -.25 -16 6.5 -.25 -2.7
  [3,0,6.5,-.25,-3.5,11,-.25,-16,6.5,-.25,-2.7],
// 3 0 6.5 -.25 -2.7 11 -.25 -16 6.5 -.25 -.7
  [3,0,6.5,-.25,-2.7,11,-.25,-16,6.5,-.25,-.7],
// 3 0 6.5 -.25 -.7 11 -.25 -16 11 -.25 16
  [3,0,6.5,-.25,-.7,11,-.25,-16,11,-.25,16],
// 3 0 -6.5 -.25 13.25 -5.5 -.25 13.25 -11 -.25 16
  [3,0,-6.5,-.25,13.25,-5.5,-.25,13.25,-11,-.25,16],
// 3 0 -11 -.25 16 -5.5 -.25 13.25 5.5 -.25 13.25
  [3,0,-11,-.25,16,-5.5,-.25,13.25,5.5,-.25,13.25],
// 3 0 -11 -.25 16 5.5 -.25 13.25 11 -.25 16
  [3,0,-11,-.25,16,5.5,-.25,13.25,11,-.25,16],
// 3 0 11 -.25 16 5.5 -.25 13.25 6.5 -.25 13.25
  [3,0,11,-.25,16,5.5,-.25,13.25,6.5,-.25,13.25],
// 3 0 11 -.25 -16 6.5 -.25 -11.25 5.5 -.25 -11.25
  [3,0,11,-.25,-16,6.5,-.25,-11.25,5.5,-.25,-11.25],
// 3 0 -6.5 -.25 -11.25 -11 -.25 -16 -5.5 -.25 -11.25
  [3,0,-6.5,-.25,-11.25,-11,-.25,-16,-5.5,-.25,-11.25],
// 3 0 -5.5 -.25 -11.25 -11 -.25 -16 5.5 -.25 -11.25
  [3,0,-5.5,-.25,-11.25,-11,-.25,-16,5.5,-.25,-11.25],
// 3 0 5.5 -.25 -11.25 -11 -.25 -16 11 -.25 -16
  [3,0,5.5,-.25,-11.25,-11,-.25,-16,11,-.25,-16],
];
module ldraw_lib__4111899j(step=0, col=false, unit=2/5, alt=false, line=0.2, solid=!$preview)
    makepoly(ldraw_lib__4111899j(solid), step=step, col=col, unit=unit, alt=alt, line=line, solid=solid);
ldraw_lib__4111899j(line=0.2);
